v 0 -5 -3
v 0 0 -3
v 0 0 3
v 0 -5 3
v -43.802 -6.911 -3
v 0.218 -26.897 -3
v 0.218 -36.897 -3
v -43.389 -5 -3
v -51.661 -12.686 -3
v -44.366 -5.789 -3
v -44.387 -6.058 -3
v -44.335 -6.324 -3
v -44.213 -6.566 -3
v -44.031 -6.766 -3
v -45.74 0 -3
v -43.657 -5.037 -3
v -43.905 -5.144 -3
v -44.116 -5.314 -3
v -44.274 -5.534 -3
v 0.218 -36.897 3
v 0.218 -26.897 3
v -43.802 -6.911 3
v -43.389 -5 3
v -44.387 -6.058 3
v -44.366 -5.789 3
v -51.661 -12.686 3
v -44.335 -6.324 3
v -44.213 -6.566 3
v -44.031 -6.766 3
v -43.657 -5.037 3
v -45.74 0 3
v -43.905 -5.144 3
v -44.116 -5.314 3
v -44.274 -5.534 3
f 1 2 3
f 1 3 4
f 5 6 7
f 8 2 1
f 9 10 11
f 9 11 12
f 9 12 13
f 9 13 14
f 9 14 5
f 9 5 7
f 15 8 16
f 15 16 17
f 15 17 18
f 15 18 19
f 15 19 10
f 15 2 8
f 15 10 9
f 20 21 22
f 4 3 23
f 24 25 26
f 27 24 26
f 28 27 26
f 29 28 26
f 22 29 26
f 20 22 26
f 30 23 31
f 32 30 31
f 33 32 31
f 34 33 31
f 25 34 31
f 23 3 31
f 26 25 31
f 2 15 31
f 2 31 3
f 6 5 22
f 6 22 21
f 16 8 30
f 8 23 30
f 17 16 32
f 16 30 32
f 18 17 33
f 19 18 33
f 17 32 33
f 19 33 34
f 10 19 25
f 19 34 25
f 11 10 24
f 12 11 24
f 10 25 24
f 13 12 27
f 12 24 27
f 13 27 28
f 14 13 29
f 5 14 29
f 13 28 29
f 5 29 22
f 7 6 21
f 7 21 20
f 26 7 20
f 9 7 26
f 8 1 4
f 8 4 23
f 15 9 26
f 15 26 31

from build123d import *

# Parameters (mm, degrees)
BOSS_EXTRUDE1_DEPTH      = 3
BOSS_EXTRUDE1_DEPTH_BACK = 3
FILLET1_R                = 1


with BuildPart() as part:
    # Sketch2 → Boss-Extrude1 (new, two sides: drawn at the far end of the back side and taken through both)
    with BuildSketch(Plane.XY.offset(-BOSS_EXTRUDE1_DEPTH_BACK)):
        Polygon((0, 0), (0, -5), (-48.01, -5), (0.217510674, -26.897270955), (0.217510674, -36.897270955), (-51.661084359, -12.686242943), (-45.74, 0), align=None)
    extrude(amount=BOSS_EXTRUDE1_DEPTH + BOSS_EXTRUDE1_DEPTH_BACK)

    # Fillet1
    fillet1_edges = [part.edges().sort_by_distance(p)[0] for p in [
        (-48.01, -5, 0),
    ]]
    fillet(fillet1_edges, radius=FILLET1_R)


solid = part.part
